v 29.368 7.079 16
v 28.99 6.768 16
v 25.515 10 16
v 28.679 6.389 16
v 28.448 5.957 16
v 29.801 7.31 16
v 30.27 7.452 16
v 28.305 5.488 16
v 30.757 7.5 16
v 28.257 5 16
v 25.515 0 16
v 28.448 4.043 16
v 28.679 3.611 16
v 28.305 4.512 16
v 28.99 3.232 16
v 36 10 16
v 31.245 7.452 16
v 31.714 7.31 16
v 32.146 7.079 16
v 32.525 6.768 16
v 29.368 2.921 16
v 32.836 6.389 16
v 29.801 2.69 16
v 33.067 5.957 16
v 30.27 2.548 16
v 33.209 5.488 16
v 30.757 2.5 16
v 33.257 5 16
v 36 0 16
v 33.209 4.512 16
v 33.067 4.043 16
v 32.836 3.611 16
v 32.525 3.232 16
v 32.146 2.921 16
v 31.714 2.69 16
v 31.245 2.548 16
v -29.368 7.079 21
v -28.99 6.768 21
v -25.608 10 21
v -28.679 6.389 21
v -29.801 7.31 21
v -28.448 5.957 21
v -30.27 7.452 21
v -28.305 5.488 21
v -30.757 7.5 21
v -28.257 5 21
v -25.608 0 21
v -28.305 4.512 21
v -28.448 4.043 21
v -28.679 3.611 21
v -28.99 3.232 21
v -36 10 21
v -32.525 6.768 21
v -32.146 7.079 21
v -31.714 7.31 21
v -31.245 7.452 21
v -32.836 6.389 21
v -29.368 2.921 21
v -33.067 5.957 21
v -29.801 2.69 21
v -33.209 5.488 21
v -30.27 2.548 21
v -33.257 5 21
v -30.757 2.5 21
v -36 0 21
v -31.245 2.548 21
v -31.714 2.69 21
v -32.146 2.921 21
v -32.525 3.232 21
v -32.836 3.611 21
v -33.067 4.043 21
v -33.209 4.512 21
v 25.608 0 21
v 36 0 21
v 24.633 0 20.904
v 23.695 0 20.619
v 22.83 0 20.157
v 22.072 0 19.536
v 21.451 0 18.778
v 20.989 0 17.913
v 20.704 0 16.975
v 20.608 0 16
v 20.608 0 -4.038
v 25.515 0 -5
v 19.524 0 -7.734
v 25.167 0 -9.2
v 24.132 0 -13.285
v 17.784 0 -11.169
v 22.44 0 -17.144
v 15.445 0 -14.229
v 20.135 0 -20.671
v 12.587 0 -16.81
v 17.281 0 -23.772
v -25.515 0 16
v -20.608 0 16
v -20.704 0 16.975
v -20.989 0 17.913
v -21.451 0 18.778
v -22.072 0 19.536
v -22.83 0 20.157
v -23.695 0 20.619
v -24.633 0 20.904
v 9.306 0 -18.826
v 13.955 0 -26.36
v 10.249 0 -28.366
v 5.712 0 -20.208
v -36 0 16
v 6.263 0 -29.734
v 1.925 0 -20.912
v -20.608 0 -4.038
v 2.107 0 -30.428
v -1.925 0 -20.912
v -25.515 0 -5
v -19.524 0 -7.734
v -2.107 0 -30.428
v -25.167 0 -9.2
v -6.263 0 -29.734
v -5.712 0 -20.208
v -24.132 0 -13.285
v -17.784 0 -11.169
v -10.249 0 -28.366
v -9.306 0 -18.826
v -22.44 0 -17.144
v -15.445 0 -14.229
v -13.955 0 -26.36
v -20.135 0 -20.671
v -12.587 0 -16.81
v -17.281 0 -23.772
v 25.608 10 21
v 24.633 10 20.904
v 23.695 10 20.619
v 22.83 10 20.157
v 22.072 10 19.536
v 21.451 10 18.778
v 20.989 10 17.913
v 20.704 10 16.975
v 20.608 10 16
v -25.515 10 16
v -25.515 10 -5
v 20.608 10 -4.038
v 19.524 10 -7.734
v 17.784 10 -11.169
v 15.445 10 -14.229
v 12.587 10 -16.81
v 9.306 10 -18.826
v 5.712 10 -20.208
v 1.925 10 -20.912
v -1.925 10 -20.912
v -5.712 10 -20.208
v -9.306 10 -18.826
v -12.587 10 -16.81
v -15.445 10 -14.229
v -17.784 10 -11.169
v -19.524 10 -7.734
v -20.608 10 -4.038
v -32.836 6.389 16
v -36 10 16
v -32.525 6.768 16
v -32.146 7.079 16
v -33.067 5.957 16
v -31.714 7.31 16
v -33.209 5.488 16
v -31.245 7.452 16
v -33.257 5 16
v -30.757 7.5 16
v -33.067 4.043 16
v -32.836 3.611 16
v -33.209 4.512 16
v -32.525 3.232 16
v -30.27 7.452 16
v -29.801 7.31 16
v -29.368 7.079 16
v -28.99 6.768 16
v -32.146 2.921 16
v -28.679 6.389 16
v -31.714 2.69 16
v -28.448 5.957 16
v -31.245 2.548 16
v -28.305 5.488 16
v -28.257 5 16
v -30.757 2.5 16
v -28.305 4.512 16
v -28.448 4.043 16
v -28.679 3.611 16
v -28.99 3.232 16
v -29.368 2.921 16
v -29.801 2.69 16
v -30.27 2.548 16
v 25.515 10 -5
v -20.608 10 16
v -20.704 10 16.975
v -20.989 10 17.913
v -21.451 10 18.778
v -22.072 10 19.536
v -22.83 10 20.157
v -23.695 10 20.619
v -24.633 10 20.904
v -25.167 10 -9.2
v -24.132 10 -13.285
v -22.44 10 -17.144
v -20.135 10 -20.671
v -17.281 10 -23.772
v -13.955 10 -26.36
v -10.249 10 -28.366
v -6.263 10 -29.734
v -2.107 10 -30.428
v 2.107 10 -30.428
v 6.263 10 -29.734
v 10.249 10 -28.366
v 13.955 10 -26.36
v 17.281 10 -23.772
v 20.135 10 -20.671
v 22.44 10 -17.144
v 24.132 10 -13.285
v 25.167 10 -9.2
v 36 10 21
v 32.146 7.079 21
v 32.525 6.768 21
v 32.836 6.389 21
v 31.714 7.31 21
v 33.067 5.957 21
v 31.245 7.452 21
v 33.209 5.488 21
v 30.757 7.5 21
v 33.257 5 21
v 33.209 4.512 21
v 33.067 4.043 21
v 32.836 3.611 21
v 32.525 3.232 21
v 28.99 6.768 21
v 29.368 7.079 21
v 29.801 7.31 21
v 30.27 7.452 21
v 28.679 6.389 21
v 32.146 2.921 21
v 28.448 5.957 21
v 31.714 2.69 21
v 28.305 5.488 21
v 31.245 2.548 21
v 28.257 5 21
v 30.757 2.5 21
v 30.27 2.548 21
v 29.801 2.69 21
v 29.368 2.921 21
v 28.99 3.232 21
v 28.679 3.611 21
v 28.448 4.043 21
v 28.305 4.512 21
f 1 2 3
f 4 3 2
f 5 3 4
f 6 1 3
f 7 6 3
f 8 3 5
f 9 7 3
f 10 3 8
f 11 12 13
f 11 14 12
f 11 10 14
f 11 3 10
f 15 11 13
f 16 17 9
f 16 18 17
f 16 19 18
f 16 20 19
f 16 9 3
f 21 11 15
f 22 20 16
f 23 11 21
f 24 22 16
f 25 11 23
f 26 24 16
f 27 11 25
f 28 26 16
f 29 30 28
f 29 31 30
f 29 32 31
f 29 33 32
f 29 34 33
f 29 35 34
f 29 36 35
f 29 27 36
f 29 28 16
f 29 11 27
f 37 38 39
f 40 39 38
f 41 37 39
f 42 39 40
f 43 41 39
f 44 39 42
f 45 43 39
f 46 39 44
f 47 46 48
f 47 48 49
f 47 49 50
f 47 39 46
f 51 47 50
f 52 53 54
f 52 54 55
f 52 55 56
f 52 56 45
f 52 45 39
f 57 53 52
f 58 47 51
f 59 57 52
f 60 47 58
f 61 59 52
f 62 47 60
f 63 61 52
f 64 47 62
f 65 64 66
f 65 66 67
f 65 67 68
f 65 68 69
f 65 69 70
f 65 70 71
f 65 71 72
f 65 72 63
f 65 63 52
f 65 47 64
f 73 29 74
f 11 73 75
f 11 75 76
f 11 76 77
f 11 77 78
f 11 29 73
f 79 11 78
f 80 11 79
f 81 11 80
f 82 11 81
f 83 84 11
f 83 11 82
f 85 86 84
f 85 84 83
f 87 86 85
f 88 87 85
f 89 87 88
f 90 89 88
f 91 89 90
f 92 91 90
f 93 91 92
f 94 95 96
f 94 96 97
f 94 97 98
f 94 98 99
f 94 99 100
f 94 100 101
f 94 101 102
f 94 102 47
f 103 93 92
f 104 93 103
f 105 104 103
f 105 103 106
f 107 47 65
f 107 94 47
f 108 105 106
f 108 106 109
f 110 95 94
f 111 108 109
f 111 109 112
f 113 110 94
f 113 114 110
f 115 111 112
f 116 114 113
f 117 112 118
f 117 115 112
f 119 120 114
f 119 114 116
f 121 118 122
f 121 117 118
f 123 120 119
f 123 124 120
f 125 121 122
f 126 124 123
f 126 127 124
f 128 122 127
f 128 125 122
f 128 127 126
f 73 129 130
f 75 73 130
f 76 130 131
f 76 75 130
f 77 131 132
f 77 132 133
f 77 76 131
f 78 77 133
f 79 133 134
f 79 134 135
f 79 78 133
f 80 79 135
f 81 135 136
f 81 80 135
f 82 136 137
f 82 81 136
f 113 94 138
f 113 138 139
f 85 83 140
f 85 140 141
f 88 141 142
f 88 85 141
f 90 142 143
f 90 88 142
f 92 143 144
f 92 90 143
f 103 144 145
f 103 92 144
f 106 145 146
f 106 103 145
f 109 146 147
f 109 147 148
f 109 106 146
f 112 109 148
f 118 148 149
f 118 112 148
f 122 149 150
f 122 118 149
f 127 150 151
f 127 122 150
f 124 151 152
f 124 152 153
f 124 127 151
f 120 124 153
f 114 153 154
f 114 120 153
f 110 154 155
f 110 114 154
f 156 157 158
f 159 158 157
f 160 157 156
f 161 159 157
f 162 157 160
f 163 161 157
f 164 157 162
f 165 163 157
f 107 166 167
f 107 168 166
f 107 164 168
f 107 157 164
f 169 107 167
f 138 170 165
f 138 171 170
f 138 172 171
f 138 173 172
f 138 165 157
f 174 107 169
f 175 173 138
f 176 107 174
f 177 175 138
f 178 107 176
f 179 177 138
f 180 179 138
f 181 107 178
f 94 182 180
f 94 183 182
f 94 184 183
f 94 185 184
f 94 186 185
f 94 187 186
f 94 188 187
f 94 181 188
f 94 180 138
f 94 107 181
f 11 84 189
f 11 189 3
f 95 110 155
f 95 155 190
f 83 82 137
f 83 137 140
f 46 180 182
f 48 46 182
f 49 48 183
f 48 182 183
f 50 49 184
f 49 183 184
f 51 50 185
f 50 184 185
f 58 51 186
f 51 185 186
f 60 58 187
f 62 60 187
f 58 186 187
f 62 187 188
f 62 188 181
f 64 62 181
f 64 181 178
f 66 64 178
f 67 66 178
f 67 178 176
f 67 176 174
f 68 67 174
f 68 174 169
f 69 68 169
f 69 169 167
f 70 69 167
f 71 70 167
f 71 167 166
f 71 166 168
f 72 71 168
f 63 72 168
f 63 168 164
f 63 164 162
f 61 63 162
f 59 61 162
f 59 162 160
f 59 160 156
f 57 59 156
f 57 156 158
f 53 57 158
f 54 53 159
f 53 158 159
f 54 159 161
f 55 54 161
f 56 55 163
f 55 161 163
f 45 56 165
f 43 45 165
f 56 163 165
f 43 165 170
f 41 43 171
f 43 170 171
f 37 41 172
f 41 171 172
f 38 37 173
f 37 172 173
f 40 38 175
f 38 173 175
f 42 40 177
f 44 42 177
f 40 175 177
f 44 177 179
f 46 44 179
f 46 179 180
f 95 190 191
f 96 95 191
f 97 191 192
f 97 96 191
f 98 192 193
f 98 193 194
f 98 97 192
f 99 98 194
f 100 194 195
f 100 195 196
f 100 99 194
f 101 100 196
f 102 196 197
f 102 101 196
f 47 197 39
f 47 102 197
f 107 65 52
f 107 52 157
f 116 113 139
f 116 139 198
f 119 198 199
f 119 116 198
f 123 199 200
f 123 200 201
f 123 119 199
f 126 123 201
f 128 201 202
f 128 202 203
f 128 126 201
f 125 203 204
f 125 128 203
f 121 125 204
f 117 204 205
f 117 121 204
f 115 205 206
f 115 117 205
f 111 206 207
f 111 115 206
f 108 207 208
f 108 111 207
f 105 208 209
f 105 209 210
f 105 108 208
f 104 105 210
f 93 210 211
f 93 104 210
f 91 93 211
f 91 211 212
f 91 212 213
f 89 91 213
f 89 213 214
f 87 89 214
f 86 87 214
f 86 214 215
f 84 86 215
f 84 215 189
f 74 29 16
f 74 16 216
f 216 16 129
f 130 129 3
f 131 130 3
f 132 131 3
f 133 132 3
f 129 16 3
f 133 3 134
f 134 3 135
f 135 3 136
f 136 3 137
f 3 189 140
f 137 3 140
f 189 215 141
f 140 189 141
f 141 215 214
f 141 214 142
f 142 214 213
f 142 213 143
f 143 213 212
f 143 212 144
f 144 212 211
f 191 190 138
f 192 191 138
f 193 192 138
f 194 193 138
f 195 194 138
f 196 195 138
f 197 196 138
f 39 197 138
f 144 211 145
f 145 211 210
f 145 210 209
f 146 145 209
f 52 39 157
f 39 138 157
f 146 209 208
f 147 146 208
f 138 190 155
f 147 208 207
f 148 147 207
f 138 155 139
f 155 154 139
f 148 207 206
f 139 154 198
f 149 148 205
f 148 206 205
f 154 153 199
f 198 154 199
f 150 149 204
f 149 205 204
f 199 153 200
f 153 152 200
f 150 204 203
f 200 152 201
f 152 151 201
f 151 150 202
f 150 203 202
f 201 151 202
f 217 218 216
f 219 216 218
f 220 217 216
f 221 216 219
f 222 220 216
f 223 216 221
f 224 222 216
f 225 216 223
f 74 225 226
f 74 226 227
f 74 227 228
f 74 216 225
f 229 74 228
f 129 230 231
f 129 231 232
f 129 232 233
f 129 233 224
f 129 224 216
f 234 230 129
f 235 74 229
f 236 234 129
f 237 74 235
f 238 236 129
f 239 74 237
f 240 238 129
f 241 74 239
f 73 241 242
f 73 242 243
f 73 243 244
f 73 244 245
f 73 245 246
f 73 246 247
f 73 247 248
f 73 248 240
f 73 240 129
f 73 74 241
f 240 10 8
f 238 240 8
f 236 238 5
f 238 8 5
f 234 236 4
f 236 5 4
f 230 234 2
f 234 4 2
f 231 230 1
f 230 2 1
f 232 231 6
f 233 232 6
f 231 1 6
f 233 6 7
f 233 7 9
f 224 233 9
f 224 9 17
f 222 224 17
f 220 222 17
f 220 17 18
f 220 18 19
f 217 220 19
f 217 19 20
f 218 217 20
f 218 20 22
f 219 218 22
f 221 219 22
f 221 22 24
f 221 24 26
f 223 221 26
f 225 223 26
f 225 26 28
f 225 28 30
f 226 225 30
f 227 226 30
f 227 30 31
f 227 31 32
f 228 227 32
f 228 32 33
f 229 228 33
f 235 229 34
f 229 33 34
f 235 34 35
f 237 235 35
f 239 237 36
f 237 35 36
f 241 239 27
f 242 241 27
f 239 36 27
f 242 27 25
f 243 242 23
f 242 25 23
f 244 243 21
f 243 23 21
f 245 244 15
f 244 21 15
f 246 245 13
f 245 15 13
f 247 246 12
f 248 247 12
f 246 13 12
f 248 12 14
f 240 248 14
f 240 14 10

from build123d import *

# Parameters (mm, degrees)
BOSS_EXTRUDE1_DEPTH = 10
SKETCH4_R           = 2.5
CUT_EXTRUDE1_DEPTH  = 60.662529858


with BuildPart() as part:
    # Sketch1<2> → Boss-Extrude1 (new body)
    with BuildSketch(Plane(origin=(0, 0, 0), x_dir=(1, 0, 0), z_dir=(0, 1, 0))):
        with BuildLine():
            Line((-20.608028251, 4.038461538), (-20.608028251, -16))
            ThreePointArc((-20.608028251, -16), (-22.072494345, -19.535533906), (-25.608028251, -21))
            Line((-25.608028251, -21), (-36, -21))
            Line((-36, -21), (-36, -16))
            Line((-36, -16), (-25.514701644, -16))
            Line((-25.514701644, -16), (-25.514701644, 5))
            ThreePointArc((-25.514701644, 5), (0, 30.514701644), (25.514701644, 5))
            Line((25.514701644, 5), (25.514701644, -16))
            Line((25.514701644, -16), (36, -16))
            Line((36, -16), (36, -21))
            Line((36, -21), (25.608028251, -21))
            ThreePointArc((25.608028251, -21), (22.072494345, -19.535533906), (20.608028251, -16))
            Line((20.608028251, -16), (20.608028251, 4.038461538))
            ThreePointArc((20.608028251, 4.038461538), (0, 21), (-20.608028251, 4.038461538))
        make_face()
    extrude(amount=BOSS_EXTRUDE1_DEPTH)

    # Sketch4 → Cut-Extrude1 (cut, through all)
    with BuildSketch(Plane(origin=(0, 0, 16), x_dir=(-1, 0, 0), z_dir=(0, 0, -1))):
        with Locations((-30.757350822, 5)):
            Circle(SKETCH4_R)
        with Locations((30.757350822, 5)):
            Circle(SKETCH4_R)
    extrude(amount=-CUT_EXTRUDE1_DEPTH, mode=Mode.SUBTRACT)


solid = part.part
